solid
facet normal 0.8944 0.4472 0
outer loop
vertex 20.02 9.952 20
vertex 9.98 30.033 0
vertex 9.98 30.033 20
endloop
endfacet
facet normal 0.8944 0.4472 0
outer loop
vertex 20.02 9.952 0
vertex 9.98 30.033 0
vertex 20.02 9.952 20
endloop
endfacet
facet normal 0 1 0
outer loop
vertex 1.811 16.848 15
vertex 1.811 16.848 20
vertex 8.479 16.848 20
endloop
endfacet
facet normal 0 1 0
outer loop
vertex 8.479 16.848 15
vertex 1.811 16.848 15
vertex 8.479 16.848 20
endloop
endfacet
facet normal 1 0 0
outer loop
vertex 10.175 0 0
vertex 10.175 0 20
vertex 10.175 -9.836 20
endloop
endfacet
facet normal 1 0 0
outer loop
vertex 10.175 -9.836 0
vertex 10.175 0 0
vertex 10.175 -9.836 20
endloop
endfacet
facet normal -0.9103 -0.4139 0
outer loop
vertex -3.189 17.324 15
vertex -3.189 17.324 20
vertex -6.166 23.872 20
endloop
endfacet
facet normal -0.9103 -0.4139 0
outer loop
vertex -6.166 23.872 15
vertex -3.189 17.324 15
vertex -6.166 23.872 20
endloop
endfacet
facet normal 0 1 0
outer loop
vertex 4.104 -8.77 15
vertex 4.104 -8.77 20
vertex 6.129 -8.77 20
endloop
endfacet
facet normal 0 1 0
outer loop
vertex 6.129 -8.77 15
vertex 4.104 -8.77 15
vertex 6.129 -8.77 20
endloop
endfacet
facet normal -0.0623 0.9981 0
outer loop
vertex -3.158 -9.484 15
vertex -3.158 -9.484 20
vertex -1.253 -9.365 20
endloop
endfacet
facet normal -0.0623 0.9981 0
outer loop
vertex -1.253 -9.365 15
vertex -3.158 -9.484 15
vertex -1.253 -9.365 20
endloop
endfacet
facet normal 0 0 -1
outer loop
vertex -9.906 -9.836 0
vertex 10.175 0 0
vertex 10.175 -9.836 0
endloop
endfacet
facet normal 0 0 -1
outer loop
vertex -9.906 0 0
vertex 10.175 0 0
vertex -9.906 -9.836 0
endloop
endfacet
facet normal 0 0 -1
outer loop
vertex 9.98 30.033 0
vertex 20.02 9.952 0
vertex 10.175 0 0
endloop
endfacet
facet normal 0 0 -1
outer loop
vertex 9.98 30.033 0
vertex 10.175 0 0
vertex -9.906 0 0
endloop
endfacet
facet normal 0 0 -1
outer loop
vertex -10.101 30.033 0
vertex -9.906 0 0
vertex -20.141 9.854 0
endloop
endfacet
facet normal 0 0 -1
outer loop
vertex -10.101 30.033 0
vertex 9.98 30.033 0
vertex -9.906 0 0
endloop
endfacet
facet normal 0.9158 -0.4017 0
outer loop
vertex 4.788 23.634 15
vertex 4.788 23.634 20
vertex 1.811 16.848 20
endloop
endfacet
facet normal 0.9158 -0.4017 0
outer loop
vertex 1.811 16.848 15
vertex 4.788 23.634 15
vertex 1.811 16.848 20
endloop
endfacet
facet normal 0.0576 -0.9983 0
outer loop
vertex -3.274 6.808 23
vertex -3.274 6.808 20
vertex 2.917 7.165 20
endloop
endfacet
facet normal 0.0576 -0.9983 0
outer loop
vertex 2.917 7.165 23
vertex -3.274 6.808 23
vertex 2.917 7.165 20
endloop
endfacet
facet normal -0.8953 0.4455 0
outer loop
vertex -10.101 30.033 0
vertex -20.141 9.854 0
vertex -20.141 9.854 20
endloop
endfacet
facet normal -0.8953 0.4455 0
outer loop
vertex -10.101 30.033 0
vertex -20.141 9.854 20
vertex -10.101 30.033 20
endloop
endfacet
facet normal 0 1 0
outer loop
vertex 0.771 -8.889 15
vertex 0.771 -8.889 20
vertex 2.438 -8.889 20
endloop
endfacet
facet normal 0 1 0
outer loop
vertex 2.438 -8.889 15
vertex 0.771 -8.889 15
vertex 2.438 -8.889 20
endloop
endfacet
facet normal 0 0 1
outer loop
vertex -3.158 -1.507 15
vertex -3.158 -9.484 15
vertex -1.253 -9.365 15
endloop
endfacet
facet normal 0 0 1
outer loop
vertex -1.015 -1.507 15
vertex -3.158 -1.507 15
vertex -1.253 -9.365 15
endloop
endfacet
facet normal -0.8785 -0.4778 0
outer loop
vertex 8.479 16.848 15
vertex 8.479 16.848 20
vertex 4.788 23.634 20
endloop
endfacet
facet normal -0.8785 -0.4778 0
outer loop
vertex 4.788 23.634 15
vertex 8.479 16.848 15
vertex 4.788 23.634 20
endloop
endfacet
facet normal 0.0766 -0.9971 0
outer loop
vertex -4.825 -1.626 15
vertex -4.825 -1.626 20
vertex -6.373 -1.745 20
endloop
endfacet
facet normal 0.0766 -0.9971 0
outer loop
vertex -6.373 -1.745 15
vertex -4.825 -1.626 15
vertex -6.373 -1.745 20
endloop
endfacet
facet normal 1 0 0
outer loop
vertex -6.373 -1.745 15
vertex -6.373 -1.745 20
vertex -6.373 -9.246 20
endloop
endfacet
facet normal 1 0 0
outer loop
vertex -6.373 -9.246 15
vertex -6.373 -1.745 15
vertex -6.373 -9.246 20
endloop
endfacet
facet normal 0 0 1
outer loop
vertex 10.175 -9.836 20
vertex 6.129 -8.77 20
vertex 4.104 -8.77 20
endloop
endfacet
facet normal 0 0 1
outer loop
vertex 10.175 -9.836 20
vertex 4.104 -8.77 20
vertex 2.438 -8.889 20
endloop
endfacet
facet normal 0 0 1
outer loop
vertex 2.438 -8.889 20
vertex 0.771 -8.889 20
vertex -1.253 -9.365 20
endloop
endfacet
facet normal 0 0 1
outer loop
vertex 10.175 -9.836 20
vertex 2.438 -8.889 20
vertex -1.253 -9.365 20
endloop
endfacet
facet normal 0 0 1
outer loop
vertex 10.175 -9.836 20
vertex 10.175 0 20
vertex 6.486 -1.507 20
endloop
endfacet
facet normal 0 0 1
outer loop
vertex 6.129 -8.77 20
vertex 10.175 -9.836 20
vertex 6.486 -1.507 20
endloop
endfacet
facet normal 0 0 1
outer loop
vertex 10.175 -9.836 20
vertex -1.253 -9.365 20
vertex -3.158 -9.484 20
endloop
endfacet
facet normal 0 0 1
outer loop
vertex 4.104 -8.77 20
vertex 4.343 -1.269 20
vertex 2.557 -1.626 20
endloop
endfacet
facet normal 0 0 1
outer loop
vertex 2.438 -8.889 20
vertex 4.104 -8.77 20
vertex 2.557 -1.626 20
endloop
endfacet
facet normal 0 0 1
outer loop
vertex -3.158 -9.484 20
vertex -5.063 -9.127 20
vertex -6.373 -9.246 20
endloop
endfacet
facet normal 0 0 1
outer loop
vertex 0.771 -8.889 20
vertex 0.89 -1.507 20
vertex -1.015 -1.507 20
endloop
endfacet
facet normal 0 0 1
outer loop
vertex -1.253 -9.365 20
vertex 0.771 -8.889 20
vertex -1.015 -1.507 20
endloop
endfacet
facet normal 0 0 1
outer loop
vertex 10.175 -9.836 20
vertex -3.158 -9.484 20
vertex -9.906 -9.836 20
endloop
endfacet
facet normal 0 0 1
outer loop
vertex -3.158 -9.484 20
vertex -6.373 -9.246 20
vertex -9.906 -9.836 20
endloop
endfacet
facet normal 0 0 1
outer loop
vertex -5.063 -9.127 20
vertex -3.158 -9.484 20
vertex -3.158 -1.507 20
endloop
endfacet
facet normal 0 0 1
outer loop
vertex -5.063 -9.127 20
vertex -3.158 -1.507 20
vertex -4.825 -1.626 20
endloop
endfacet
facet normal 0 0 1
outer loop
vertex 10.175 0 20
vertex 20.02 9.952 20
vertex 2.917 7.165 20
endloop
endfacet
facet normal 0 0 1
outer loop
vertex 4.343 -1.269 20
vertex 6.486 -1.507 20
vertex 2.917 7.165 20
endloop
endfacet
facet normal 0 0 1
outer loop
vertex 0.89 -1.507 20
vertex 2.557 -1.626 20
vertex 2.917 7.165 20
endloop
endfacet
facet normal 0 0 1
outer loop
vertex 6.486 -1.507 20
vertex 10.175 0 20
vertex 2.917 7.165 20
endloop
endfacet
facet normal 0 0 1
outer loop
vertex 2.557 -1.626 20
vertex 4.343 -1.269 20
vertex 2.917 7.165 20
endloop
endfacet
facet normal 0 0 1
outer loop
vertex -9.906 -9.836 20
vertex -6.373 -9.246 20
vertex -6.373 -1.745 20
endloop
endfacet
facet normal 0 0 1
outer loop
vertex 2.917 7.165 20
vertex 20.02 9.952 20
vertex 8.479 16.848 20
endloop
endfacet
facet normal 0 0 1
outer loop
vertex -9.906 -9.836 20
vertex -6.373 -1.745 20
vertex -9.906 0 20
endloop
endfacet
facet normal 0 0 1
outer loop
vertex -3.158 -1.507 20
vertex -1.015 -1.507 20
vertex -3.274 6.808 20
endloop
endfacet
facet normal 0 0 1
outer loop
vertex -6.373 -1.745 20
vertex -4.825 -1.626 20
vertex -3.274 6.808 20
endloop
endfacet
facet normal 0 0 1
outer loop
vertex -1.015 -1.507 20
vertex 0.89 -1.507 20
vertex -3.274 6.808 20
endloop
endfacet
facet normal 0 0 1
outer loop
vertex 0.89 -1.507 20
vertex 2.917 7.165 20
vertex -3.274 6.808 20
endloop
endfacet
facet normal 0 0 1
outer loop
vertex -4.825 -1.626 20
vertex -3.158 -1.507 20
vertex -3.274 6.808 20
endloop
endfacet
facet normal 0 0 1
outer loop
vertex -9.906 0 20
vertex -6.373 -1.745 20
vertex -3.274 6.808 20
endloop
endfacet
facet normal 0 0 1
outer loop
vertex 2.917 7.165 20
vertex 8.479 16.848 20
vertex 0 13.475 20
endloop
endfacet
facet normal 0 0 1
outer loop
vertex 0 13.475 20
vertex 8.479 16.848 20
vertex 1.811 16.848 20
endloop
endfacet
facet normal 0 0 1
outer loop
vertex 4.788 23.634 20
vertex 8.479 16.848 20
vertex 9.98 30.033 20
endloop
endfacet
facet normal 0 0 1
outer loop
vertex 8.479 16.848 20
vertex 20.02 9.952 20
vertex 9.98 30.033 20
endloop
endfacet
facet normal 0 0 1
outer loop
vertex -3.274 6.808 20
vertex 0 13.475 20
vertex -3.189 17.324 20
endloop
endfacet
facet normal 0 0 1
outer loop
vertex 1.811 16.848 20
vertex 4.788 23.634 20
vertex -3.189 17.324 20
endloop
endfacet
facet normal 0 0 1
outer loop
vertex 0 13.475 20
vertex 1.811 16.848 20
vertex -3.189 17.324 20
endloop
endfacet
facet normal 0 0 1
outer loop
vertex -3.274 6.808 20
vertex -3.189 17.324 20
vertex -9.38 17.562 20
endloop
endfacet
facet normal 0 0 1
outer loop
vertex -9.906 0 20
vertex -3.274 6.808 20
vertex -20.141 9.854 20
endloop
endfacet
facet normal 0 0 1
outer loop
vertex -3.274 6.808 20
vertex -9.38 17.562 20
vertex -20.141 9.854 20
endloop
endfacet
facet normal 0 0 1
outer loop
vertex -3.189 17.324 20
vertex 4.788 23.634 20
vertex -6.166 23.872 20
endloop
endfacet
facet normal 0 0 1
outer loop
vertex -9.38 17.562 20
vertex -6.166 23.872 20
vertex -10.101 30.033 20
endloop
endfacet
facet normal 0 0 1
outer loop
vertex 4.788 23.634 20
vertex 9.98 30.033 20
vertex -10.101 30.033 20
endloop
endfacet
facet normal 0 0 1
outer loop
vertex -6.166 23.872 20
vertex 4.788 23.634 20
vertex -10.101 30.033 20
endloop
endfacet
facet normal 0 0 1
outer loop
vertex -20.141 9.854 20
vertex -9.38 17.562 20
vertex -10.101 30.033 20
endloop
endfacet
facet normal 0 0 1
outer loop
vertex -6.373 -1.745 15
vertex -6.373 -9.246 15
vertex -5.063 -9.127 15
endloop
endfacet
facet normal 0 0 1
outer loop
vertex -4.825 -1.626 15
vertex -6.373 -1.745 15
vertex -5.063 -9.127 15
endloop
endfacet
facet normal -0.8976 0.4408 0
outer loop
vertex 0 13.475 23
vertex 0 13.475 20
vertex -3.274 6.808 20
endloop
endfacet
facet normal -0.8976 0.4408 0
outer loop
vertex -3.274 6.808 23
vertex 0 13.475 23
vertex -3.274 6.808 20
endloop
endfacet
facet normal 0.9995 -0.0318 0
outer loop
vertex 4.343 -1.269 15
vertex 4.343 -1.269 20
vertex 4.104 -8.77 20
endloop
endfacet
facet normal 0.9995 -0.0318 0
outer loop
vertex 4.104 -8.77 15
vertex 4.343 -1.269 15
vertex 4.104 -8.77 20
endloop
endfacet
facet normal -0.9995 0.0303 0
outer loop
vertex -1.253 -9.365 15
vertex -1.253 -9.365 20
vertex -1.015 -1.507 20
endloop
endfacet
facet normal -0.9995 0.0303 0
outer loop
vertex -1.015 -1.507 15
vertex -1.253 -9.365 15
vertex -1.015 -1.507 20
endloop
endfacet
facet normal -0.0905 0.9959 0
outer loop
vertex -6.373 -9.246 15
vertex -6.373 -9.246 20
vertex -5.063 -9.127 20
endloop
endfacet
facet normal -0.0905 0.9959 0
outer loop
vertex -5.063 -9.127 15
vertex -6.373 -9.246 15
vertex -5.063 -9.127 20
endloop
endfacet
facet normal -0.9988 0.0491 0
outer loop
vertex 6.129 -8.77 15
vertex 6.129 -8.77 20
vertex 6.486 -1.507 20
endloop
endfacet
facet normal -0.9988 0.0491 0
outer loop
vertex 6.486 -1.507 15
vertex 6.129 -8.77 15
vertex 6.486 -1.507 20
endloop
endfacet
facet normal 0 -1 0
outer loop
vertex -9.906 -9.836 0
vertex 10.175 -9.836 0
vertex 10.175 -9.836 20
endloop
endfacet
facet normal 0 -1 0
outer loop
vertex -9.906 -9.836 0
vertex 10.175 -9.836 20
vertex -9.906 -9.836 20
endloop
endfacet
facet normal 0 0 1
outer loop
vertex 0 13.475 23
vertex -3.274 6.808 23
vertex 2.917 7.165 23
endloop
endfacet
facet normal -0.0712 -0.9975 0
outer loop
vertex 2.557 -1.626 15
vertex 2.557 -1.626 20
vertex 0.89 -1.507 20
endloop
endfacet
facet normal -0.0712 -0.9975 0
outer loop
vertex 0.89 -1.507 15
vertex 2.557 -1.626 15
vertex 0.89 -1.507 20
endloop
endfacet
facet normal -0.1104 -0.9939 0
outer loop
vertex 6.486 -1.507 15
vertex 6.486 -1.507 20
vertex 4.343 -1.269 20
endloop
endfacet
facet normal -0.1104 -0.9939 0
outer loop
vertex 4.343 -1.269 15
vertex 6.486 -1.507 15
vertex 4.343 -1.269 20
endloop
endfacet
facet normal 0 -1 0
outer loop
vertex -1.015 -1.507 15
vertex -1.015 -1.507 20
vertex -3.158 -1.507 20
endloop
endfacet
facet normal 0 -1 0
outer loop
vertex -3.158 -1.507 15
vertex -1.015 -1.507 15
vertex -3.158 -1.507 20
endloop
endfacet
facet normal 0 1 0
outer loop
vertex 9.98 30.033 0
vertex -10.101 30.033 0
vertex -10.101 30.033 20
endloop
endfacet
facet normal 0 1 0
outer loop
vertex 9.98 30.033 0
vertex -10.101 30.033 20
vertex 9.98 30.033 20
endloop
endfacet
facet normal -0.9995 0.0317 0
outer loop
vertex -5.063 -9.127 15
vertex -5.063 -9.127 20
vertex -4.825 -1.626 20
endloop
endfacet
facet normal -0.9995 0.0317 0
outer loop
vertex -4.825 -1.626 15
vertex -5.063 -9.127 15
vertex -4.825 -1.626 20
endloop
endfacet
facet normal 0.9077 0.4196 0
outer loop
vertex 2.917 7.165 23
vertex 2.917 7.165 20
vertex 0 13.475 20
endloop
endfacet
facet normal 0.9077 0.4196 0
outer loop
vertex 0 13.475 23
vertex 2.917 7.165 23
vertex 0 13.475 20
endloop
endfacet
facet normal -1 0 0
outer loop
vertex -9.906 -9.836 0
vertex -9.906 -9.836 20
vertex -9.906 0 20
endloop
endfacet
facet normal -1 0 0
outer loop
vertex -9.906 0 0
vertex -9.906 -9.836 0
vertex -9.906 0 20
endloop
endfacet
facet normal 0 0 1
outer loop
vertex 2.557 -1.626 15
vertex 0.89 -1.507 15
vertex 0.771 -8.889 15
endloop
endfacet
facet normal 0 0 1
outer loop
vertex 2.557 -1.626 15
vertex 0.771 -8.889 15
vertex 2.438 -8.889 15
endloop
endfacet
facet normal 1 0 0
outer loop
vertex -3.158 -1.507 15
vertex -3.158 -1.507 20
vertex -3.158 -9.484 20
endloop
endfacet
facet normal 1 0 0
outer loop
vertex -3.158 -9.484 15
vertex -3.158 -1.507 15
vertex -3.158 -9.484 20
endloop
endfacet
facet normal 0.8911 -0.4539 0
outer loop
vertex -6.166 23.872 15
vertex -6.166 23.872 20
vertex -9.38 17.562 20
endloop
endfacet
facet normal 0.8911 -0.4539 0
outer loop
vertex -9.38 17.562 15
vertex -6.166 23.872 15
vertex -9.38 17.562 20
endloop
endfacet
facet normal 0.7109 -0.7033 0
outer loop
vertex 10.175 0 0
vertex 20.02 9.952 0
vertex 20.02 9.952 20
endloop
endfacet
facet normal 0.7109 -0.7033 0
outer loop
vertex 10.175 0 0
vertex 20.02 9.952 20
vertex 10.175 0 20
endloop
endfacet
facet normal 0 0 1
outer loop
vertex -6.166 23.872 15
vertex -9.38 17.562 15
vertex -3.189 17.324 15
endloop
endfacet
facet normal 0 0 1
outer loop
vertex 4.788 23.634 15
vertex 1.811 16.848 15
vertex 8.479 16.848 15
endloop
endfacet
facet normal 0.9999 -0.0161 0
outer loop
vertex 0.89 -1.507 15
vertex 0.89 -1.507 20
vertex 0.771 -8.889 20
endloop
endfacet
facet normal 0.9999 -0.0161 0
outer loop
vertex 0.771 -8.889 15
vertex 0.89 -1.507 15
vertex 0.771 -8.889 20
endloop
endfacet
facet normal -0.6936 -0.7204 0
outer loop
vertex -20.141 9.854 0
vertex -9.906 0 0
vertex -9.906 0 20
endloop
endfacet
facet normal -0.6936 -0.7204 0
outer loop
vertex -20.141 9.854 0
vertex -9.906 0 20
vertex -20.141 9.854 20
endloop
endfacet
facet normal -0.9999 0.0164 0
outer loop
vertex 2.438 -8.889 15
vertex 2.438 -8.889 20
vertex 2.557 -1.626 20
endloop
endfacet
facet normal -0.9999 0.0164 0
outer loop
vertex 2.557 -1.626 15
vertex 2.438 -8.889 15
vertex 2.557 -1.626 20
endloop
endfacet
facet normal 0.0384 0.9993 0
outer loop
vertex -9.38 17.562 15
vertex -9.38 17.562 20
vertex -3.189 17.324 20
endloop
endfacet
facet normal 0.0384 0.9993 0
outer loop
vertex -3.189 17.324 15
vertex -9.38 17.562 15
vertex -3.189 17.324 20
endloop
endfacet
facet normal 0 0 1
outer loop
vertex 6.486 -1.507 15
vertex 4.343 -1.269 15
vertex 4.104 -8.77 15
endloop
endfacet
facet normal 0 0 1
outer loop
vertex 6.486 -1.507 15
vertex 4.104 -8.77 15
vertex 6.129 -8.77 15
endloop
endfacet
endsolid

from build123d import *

# Parameters (mm, degrees)
PAD_DEPTH       = 20
POCKET_DEPTH    = 5
POCKET001_DEPTH = 5
PAD001_DEPTH    = 3


with BuildPart() as part:
    # Sketch → Pad (new body)
    with BuildSketch(Plane.XY):
        Polygon((-10.101072, 30.032787), (9.979783, 30.032787), (20.020205, 9.951933), (10.174738, 0), (10.174738, -9.836479), (-9.906112, -9.836479), (-9.906112, 0), (-20.141495, 9.854452), align=None)
    extrude(amount=PAD_DEPTH)

    # Sketch001 (on Face10 of Pad) → Pocket (cut)
    with BuildSketch(Plane.XY.offset(20)):
        Polygon((-6.373003, -1.744858), (-6.373003, -9.245775), (-5.063322, -9.126713), (-4.825196, -1.625796), align=None)
        Polygon((-3.158328, -1.506734), (-3.158328, -9.483899), (-1.253332, -9.364837), (-1.015209, -1.506734), align=None)
        Polygon((0.889791, -1.506734), (0.770723, -8.888589), (2.437592, -8.888589), (2.556656, -1.625796), align=None)
        Polygon((4.342592, -1.268609), (4.104469, -8.769526), (6.128524, -8.769526), (6.485711, -1.506734), align=None)
    extrude(amount=-POCKET_DEPTH, mode=Mode.SUBTRACT)

    # Sketch002 (on Face5 of Pocket) → Pocket001 (cut)
    with BuildSketch(Plane.XY.offset(20)):
        Polygon((-6.165723, 23.872267), (-9.380401, 17.56197), (-3.18917, 17.323847), align=None)
        Polygon((4.788002, 23.634144), (1.811443, 16.847597), (8.478922, 16.847597), align=None)
    extrude(amount=-POCKET001_DEPTH, mode=Mode.SUBTRACT)

    # Sketch004 (on Face5 of Pocket001) → Pad001 (join)
    with BuildSketch(Plane.XY.offset(20)):
        Polygon((0, 13.475349), (-3.27434, 6.807868), (2.916898, 7.165055), align=None)
    extrude(amount=PAD001_DEPTH)


solid = part.part
